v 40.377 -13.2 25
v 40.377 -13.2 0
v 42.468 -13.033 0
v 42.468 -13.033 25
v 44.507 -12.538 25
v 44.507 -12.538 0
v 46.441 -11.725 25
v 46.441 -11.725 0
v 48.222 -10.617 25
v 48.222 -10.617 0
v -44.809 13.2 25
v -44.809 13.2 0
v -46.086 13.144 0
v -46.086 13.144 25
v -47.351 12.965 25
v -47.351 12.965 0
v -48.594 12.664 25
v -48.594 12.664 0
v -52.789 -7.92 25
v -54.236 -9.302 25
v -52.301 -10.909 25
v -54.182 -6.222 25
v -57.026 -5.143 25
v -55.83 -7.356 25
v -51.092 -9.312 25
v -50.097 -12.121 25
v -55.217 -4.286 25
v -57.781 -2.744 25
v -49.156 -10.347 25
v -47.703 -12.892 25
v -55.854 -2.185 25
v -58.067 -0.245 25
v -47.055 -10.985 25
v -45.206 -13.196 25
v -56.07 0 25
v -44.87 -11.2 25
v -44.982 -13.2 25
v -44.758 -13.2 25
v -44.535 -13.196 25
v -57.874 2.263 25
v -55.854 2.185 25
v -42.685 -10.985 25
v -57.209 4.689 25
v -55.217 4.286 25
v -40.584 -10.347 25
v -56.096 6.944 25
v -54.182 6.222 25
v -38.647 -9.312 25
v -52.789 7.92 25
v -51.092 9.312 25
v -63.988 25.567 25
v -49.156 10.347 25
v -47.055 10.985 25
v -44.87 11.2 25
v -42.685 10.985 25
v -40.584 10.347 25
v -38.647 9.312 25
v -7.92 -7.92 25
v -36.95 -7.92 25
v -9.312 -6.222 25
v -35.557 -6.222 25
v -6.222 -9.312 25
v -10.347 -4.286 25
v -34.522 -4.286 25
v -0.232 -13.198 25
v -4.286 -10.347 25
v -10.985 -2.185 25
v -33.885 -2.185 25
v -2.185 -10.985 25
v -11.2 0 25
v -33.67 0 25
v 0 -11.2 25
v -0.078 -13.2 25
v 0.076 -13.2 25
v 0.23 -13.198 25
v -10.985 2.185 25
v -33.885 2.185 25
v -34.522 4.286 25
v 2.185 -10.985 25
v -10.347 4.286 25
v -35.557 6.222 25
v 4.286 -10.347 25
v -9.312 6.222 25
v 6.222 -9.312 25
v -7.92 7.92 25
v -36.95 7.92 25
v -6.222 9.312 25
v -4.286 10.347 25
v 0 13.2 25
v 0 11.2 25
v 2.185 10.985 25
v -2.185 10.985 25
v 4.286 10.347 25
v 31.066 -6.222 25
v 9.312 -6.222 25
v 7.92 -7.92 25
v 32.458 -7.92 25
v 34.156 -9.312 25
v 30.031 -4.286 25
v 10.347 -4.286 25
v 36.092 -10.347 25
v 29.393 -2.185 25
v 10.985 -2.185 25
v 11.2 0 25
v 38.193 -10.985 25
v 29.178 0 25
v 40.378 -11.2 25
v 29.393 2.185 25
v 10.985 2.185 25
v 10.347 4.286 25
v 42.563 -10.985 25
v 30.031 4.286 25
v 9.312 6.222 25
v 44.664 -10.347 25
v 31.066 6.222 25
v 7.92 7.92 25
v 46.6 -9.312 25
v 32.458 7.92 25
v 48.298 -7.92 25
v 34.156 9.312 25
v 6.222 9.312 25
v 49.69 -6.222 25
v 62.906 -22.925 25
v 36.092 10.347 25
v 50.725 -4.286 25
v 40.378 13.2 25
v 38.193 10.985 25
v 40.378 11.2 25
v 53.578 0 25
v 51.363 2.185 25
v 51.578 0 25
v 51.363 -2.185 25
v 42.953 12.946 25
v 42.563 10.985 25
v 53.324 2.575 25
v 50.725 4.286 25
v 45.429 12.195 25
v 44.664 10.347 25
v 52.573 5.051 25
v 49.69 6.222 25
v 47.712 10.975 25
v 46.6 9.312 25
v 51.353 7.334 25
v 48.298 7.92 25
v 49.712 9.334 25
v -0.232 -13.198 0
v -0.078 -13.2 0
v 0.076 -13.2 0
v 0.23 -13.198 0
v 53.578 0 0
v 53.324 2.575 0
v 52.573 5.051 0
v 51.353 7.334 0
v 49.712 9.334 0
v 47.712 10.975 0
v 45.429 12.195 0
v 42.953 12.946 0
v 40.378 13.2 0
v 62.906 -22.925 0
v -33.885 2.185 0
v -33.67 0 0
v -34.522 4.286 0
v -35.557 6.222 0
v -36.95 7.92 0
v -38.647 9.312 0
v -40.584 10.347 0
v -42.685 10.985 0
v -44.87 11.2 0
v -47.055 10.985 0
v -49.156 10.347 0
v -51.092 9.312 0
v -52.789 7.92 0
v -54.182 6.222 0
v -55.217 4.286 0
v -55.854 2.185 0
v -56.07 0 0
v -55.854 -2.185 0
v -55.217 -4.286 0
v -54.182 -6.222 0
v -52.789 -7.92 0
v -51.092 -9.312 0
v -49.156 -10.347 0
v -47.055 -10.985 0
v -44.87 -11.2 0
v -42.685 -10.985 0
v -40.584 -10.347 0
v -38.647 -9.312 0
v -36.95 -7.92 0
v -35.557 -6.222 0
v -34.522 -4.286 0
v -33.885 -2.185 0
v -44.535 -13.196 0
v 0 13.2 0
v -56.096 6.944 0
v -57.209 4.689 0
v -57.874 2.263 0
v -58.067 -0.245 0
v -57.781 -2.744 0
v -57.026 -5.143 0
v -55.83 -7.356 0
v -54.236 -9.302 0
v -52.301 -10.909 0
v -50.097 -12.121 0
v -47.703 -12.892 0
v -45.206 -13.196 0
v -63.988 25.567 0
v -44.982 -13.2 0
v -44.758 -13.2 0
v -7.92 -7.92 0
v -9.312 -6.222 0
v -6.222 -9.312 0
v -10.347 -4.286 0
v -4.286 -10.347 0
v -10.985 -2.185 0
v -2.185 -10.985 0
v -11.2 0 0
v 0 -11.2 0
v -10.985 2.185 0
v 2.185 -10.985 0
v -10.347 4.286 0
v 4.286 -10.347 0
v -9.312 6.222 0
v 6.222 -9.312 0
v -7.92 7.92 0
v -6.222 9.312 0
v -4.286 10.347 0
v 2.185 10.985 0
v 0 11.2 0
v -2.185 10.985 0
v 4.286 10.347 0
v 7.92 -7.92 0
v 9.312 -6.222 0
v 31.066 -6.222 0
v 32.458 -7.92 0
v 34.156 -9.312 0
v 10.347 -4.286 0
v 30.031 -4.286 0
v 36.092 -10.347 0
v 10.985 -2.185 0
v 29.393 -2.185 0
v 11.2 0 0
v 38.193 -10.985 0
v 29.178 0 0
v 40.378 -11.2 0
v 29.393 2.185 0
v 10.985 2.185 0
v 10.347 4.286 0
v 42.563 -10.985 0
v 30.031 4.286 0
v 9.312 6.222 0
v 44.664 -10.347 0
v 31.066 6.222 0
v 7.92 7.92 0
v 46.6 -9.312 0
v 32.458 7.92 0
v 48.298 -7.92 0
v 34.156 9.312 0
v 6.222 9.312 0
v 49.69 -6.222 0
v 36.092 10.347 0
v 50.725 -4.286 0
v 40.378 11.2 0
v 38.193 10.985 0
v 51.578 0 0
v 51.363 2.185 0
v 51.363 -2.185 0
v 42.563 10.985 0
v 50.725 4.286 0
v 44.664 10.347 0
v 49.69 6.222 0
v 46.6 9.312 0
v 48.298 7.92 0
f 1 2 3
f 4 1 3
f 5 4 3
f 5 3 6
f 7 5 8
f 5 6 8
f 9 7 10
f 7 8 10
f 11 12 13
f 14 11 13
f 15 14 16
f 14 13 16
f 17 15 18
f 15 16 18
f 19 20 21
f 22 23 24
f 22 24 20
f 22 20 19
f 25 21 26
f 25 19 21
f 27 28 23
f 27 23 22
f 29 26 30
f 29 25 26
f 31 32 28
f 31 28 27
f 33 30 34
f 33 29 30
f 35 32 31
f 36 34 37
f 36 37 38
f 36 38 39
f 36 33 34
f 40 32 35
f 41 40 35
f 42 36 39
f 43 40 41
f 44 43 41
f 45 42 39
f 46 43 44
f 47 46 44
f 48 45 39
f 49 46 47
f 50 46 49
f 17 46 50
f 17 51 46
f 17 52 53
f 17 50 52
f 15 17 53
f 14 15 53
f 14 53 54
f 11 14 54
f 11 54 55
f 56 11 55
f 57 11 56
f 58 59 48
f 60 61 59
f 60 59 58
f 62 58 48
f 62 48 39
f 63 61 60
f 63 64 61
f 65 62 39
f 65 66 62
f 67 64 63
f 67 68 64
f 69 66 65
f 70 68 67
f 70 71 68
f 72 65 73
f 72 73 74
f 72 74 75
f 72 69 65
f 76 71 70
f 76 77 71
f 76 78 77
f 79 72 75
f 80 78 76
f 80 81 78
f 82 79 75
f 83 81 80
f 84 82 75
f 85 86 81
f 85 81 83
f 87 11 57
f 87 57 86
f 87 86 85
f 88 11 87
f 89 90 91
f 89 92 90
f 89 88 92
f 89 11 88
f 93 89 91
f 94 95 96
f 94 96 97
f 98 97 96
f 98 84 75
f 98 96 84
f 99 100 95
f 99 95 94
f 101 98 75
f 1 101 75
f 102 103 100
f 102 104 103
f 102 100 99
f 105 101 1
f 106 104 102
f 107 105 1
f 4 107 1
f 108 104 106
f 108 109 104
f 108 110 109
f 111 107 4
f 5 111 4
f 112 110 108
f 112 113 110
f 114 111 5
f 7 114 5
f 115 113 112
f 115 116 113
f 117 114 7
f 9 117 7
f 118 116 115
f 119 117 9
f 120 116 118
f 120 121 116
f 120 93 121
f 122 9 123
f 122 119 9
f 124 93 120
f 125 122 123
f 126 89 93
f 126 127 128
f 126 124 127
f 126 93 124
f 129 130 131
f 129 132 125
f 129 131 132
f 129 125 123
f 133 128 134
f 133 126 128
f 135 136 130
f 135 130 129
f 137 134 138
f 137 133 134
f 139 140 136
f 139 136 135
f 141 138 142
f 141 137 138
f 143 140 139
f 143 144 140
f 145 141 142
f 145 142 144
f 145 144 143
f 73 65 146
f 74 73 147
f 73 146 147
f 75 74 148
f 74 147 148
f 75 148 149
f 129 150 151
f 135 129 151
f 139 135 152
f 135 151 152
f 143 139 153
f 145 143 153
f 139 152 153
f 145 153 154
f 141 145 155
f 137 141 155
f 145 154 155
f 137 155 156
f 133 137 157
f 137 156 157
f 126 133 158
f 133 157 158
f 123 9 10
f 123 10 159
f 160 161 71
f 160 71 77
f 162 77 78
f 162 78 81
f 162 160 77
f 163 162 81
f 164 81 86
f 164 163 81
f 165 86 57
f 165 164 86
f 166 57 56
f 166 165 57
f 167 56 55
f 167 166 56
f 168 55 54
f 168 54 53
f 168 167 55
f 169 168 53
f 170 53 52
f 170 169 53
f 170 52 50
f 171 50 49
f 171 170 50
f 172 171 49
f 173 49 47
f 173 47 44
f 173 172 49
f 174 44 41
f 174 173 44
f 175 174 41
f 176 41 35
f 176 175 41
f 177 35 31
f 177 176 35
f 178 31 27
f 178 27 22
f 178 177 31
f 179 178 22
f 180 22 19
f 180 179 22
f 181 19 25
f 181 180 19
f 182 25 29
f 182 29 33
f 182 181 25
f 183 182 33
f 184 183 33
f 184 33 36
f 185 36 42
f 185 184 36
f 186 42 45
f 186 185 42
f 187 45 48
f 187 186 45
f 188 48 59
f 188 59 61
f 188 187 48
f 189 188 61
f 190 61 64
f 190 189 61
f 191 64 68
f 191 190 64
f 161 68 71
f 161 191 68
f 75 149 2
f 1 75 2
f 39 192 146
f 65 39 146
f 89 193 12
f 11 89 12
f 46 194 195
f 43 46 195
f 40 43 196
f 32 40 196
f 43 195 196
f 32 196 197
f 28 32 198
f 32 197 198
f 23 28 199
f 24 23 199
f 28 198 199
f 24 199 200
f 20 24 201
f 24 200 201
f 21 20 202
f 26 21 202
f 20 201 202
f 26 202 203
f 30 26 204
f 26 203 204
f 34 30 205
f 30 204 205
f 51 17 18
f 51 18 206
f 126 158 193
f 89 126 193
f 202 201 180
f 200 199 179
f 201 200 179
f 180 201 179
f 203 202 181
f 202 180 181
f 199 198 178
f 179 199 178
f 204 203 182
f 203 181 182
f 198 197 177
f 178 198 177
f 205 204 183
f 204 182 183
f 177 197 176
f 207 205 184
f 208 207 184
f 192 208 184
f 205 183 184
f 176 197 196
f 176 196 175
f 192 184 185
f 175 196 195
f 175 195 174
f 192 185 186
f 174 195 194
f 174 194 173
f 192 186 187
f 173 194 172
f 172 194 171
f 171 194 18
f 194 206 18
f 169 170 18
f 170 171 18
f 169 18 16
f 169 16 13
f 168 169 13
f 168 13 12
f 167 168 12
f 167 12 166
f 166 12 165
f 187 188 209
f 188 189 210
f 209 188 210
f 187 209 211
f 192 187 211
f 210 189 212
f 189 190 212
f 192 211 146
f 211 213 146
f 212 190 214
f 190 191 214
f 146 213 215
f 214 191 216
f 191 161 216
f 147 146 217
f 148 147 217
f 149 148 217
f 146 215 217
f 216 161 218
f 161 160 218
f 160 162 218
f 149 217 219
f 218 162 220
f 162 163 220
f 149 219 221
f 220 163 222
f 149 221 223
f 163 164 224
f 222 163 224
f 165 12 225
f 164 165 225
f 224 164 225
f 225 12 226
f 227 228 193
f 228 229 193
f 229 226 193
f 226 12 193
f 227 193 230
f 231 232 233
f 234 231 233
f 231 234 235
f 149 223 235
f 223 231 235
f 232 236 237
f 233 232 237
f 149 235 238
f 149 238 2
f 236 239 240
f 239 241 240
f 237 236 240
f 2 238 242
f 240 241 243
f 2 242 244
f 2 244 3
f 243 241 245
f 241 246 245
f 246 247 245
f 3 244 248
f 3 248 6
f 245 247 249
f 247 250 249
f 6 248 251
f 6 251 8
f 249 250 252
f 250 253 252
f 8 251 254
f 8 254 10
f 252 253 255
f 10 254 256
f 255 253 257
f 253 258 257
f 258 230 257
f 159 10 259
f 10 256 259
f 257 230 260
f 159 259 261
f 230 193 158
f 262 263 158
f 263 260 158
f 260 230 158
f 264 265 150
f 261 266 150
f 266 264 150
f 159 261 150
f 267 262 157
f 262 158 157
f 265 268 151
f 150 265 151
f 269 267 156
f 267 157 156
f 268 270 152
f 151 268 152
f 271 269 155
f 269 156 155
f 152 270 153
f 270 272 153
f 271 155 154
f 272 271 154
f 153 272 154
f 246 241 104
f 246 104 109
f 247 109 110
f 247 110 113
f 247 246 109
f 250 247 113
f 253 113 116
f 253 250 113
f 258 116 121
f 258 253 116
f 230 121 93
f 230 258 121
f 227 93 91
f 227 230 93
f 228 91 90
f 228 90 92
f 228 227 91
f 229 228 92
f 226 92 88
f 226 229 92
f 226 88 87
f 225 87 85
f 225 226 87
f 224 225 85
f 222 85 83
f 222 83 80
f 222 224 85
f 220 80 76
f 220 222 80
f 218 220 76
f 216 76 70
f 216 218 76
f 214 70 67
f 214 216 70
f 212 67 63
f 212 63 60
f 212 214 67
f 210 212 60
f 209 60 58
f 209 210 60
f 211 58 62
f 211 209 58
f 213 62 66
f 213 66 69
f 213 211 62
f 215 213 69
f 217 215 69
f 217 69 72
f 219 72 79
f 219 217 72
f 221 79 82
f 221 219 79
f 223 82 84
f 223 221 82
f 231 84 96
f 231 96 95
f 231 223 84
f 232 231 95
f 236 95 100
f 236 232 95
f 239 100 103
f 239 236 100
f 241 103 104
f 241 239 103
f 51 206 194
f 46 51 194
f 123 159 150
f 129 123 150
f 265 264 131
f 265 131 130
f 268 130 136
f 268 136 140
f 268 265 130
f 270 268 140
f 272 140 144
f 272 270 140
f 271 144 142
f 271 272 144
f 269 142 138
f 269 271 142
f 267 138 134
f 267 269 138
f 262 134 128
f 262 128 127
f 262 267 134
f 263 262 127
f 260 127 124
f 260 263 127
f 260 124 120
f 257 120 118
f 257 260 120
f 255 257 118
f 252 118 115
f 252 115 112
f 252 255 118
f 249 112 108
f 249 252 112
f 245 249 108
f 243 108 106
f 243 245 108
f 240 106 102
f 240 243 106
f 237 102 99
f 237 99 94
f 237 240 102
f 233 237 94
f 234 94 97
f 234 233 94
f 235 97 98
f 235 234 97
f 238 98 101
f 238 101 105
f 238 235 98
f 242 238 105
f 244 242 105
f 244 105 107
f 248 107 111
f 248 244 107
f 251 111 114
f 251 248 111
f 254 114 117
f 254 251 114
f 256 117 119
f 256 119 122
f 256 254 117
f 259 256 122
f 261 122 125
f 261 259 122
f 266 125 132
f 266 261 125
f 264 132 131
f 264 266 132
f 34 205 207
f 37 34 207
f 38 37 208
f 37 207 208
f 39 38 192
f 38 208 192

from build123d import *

# Parameters (mm, degrees)
F0_R     = 11.2
F1_DEPTH = 25


# Not quite as in the source:
# - ends of sketch curves that miss each other by under 0.0002 mm in the source are joined


with BuildPart() as f1:
    # F0 (on Top) → F1 (new body)
    with BuildSketch(Plane.XY):
        with BuildLine():
            ThreePointArc((0.2302689957, -13.1979913695), (9.4148699073, -9.2520389444), (13.2, 0))
            ThreePointArc((13.2, 0), (9.3338018159, 9.3338172074), (-2.1767e-05, 13.2))
            ThreePointArc((-2.1767e-05, 13.2), (-13.1994921512, 0.115788384), (-0.2315896221, -13.1979682621))
            Line((-0.2315896221, -13.1979682621), (0.2302689957, -13.1979913695))
        make_face()
        Circle(F0_R, mode=Mode.SUBTRACT)
        with BuildLine():
            ThreePointArc((-2.1767e-05, 13.2), (9.3338018159, 9.3338172074), (13.2, 0))
            ThreePointArc((13.2, 0), (9.4148699073, -9.2520389444), (0.2302689957, -13.1979913695))
            Line((0.2302689957, -13.1979913695), (40.3773476235, -13.1999999835))
            ThreePointArc((40.3773476235, -13.1999999835), (27.1780080417, 0.0003193237), (40.3779862708, 13.2))
            Line((40.3779862708, 13.2), (-2.1767e-05, 13.2))
        make_face()
        with BuildLine():
            ThreePointArc((-0.2315896221, -13.1979682621), (-13.1994921512, 0.115788384), (-2.1767e-05, 13.2))
            Line((-2.1767e-05, 13.2), (-44.8087825295, 13.1998595259))
            ThreePointArc((-44.8087825295, 13.1998595259), (-35.5143647291, 9.3122541296), (-31.6696799576, 0))
            ThreePointArc((-31.6696799576, 0), (-35.4182181161, -9.2146551242), (-44.534811633, -13.1957517105))
            Line((-44.534811633, -13.1957517105), (-0.2315896221, -13.1979682621))
        make_face()
        with BuildLine():
            ThreePointArc((-0.2315896221, -13.1979682621), (-0.0006604143, -13.1999999835), (0.2302689957, -13.1979913695))
            Line((0.2302689957, -13.1979913695), (-0.2315896221, -13.1979682621))
        make_face()
        with BuildLine():
            ThreePointArc((-31.6696799576, 0), (-35.5143647291, 9.3122541296), (-44.8087825295, 13.1998595259))
            ThreePointArc((-44.8087825295, 13.1998595259), (-46.7206749928, 13.0695760214), (-48.593555626, 12.6638363068))
            ThreePointArc((-48.593555626, 12.6638363068), (-52.8729419323, 10.4970375709), (-56.0955079711, 6.9441187643))
            ThreePointArc((-56.0955079711, 6.9441187643), (-56.4810242111, -6.2782708311), (-45.2058686841, -13.1957181366))
            Line((-45.2058686841, -13.1957181366), (-44.534811633, -13.1957517105))
            ThreePointArc((-44.534811633, -13.1957517105), (-35.4182181161, -9.2146551242), (-31.6696799576, 0))
        make_face()
        with Locations((-44.8696799576, 0)):
            Circle(F0_R, mode=Mode.SUBTRACT)
        with BuildLine():
            ThreePointArc((53.5780080378, 0), (49.7118098537, 9.3338172074), (40.3779862708, 13.2))
            ThreePointArc((40.3779862708, 13.2), (27.1780080417, 0.0003193237), (40.3773476235, -13.1999999835))
            ThreePointArc((40.3773476235, -13.1999999835), (44.5067810862, -12.5376725558), (48.2217520277, -10.6167641125))
            ThreePointArc((48.2217520277, -10.6167641125), (52.1631134821, -5.9456950533), (53.5780080378, 0))
        make_face()
        with Locations((40.3780080378, 0)):
            Circle(F0_R, mode=Mode.SUBTRACT)
        with BuildLine():
            ThreePointArc((-45.2058686841, -13.1957181366), (-44.8703403719, -13.1999999835), (-44.534811633, -13.1957517105))
            Line((-44.534811633, -13.1957517105), (-45.2058686841, -13.1957181366))
        make_face()
        with BuildLine():
            ThreePointArc((-56.0955079711, 6.9441187643), (-52.8729419323, 10.4970375709), (-48.593555626, 12.6638363068))
            Line((-48.593555626, 12.6638363068), (-63.987724483, 25.5667958409))
            Line((-63.987724483, 25.5667958409), (-56.0955079711, 6.9441187643))
        make_face()
        with BuildLine():
            Line((62.9060839376, -22.9247582743), (53.5780080378, 0))
            ThreePointArc((53.5780080378, 0), (52.1631134821, -5.9456950533), (48.2217520277, -10.6167641125))
            Line((48.2217520277, -10.6167641125), (62.9060839376, -22.9247582743))
        make_face()
    extrude(amount=F1_DEPTH)


solid = f1.part
